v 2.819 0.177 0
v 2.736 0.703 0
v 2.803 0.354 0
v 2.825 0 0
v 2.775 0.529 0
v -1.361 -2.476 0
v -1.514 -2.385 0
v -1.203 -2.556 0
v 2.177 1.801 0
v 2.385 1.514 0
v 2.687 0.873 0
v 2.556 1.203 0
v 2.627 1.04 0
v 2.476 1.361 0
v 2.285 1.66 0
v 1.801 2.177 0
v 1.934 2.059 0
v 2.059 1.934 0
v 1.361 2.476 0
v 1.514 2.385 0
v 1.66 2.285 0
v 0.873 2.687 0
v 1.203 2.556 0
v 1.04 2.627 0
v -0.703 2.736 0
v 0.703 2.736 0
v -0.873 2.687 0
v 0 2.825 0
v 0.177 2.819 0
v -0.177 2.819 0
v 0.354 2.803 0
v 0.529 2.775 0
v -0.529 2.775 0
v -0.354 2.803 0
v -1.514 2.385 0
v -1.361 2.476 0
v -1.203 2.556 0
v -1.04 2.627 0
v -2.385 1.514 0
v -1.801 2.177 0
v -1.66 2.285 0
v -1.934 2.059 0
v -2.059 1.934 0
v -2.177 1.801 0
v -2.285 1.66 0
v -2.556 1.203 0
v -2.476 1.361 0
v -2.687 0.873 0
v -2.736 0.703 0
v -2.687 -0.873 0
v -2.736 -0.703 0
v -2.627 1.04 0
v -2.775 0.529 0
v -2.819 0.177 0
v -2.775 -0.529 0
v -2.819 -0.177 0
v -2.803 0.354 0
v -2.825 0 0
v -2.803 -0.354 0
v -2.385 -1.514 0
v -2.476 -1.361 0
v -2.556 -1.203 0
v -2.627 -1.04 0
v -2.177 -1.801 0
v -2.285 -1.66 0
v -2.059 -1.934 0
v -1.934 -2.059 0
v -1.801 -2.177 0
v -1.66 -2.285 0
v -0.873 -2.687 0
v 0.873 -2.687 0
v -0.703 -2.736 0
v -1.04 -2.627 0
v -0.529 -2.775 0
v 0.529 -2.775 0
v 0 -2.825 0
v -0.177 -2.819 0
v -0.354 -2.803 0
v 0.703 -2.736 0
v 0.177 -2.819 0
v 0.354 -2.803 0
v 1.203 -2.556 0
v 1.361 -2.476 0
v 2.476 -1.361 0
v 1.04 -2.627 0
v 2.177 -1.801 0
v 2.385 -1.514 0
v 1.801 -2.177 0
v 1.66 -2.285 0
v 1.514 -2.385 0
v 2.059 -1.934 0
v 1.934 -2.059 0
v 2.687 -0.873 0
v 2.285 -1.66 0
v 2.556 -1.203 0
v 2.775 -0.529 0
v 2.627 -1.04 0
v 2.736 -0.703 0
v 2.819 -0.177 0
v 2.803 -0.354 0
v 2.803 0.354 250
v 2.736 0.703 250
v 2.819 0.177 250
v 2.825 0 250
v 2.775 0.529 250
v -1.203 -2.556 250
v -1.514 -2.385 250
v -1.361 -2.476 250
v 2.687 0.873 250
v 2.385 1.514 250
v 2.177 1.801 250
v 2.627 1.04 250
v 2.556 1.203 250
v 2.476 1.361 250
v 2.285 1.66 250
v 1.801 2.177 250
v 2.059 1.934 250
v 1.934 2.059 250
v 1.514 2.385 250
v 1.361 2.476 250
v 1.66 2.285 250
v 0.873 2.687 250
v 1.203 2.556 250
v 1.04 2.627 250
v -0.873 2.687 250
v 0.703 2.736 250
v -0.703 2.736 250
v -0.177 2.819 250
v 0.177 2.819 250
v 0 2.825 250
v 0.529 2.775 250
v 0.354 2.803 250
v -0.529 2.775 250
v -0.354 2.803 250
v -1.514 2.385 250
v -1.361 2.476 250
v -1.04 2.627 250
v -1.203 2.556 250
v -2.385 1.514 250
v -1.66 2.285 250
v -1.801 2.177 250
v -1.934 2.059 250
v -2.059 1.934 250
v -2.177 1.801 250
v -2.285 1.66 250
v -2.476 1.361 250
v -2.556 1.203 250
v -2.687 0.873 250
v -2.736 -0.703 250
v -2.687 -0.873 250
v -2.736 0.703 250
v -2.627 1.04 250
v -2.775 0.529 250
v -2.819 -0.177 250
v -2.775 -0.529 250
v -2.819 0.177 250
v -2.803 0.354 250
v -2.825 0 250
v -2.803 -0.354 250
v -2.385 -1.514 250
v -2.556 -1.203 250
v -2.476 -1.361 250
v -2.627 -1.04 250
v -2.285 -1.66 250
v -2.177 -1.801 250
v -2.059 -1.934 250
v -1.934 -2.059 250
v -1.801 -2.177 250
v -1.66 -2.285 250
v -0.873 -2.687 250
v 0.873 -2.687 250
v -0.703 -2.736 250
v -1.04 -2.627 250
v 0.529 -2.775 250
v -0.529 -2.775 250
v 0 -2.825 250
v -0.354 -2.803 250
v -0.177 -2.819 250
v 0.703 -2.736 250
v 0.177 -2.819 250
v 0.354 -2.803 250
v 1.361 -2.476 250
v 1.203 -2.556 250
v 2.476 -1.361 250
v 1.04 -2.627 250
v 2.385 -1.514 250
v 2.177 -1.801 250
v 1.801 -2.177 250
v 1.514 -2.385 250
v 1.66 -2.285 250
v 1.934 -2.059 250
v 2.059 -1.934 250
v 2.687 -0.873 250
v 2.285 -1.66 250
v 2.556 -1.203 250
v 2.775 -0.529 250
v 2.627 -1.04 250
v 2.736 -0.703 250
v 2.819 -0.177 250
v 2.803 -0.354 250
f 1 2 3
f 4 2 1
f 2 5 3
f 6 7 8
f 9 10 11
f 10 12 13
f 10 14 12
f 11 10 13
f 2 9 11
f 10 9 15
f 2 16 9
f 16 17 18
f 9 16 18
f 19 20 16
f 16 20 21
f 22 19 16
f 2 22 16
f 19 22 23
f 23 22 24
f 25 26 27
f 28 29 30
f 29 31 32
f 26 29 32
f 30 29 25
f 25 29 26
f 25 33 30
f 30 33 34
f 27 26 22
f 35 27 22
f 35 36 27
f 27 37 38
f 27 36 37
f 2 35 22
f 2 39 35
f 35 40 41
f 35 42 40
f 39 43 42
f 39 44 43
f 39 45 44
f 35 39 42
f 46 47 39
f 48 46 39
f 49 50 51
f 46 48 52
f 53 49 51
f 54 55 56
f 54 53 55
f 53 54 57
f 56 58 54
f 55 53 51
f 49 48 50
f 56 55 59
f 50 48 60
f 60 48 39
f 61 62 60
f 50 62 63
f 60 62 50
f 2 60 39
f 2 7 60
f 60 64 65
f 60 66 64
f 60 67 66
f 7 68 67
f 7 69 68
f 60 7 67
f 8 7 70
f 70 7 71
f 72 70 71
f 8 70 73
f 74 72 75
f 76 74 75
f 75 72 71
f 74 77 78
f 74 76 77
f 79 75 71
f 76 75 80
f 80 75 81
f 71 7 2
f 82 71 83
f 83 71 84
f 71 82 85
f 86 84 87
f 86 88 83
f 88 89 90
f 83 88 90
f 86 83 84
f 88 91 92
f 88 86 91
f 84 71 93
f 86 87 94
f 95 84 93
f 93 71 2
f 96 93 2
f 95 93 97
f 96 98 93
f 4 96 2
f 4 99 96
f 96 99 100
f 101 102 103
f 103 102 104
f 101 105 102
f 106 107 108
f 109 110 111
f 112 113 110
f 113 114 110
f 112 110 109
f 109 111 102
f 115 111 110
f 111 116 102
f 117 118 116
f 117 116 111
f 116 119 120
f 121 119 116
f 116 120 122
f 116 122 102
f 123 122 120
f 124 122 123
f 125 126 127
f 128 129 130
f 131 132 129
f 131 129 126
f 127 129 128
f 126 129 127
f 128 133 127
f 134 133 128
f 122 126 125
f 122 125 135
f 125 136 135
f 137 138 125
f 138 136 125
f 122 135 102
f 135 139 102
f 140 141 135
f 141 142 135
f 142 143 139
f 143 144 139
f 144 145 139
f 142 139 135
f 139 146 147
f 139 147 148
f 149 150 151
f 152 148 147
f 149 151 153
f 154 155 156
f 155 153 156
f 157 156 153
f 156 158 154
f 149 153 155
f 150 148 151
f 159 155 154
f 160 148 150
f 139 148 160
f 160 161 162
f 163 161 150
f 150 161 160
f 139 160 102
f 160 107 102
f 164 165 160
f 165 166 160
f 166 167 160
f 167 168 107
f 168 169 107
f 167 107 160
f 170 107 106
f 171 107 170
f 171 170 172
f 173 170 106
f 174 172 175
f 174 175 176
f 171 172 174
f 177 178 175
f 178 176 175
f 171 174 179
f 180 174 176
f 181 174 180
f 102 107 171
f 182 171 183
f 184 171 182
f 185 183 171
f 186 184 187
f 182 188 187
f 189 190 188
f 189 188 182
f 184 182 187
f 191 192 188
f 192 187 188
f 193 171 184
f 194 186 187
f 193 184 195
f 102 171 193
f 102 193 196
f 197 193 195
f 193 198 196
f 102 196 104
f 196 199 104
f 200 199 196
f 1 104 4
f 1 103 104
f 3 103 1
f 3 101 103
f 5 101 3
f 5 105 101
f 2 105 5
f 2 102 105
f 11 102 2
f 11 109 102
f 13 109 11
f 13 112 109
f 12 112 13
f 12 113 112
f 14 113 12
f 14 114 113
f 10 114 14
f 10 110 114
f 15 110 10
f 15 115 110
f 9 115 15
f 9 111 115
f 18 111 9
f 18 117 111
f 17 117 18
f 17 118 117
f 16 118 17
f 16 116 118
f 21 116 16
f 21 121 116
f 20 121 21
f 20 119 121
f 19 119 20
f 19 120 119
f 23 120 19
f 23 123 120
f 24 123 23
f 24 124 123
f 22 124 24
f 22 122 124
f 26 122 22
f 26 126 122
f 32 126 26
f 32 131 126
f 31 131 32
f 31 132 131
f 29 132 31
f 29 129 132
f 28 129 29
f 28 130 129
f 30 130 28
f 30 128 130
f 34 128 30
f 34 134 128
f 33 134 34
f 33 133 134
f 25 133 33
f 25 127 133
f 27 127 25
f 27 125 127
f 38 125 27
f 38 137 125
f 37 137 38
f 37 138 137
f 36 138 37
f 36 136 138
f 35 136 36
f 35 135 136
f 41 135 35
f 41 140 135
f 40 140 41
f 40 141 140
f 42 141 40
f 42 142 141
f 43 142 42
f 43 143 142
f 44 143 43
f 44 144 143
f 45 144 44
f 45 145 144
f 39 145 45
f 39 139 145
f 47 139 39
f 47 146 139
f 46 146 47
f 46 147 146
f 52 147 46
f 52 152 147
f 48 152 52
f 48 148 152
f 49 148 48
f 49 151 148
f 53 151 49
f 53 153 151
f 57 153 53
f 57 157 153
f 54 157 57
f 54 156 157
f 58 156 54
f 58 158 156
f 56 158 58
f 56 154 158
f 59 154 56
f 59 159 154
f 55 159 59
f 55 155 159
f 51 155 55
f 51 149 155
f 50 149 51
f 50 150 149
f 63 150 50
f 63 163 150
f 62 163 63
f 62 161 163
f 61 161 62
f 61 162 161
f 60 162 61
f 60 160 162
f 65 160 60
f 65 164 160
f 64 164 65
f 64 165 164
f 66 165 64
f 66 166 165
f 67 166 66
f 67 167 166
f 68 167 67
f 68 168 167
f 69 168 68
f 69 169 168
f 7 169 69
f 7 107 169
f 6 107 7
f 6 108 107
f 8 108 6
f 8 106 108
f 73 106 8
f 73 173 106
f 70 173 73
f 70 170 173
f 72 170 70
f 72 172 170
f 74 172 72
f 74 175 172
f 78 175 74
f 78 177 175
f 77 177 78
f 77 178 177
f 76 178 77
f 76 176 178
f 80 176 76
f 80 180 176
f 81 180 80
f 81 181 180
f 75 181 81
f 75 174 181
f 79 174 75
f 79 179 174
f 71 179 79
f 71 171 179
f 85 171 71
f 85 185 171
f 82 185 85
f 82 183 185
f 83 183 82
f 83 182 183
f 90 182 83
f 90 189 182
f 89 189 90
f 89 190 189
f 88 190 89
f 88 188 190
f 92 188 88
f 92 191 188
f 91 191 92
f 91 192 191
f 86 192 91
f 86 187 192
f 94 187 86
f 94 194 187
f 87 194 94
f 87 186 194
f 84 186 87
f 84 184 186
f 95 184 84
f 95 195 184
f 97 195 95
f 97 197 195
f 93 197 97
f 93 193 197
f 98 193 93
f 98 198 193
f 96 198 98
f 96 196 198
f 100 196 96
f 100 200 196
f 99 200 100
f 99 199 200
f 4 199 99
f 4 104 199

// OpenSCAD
$fn = 100;

d = 5.65;

h = 250;

linear_extrude(height = h) circle(d = d);
